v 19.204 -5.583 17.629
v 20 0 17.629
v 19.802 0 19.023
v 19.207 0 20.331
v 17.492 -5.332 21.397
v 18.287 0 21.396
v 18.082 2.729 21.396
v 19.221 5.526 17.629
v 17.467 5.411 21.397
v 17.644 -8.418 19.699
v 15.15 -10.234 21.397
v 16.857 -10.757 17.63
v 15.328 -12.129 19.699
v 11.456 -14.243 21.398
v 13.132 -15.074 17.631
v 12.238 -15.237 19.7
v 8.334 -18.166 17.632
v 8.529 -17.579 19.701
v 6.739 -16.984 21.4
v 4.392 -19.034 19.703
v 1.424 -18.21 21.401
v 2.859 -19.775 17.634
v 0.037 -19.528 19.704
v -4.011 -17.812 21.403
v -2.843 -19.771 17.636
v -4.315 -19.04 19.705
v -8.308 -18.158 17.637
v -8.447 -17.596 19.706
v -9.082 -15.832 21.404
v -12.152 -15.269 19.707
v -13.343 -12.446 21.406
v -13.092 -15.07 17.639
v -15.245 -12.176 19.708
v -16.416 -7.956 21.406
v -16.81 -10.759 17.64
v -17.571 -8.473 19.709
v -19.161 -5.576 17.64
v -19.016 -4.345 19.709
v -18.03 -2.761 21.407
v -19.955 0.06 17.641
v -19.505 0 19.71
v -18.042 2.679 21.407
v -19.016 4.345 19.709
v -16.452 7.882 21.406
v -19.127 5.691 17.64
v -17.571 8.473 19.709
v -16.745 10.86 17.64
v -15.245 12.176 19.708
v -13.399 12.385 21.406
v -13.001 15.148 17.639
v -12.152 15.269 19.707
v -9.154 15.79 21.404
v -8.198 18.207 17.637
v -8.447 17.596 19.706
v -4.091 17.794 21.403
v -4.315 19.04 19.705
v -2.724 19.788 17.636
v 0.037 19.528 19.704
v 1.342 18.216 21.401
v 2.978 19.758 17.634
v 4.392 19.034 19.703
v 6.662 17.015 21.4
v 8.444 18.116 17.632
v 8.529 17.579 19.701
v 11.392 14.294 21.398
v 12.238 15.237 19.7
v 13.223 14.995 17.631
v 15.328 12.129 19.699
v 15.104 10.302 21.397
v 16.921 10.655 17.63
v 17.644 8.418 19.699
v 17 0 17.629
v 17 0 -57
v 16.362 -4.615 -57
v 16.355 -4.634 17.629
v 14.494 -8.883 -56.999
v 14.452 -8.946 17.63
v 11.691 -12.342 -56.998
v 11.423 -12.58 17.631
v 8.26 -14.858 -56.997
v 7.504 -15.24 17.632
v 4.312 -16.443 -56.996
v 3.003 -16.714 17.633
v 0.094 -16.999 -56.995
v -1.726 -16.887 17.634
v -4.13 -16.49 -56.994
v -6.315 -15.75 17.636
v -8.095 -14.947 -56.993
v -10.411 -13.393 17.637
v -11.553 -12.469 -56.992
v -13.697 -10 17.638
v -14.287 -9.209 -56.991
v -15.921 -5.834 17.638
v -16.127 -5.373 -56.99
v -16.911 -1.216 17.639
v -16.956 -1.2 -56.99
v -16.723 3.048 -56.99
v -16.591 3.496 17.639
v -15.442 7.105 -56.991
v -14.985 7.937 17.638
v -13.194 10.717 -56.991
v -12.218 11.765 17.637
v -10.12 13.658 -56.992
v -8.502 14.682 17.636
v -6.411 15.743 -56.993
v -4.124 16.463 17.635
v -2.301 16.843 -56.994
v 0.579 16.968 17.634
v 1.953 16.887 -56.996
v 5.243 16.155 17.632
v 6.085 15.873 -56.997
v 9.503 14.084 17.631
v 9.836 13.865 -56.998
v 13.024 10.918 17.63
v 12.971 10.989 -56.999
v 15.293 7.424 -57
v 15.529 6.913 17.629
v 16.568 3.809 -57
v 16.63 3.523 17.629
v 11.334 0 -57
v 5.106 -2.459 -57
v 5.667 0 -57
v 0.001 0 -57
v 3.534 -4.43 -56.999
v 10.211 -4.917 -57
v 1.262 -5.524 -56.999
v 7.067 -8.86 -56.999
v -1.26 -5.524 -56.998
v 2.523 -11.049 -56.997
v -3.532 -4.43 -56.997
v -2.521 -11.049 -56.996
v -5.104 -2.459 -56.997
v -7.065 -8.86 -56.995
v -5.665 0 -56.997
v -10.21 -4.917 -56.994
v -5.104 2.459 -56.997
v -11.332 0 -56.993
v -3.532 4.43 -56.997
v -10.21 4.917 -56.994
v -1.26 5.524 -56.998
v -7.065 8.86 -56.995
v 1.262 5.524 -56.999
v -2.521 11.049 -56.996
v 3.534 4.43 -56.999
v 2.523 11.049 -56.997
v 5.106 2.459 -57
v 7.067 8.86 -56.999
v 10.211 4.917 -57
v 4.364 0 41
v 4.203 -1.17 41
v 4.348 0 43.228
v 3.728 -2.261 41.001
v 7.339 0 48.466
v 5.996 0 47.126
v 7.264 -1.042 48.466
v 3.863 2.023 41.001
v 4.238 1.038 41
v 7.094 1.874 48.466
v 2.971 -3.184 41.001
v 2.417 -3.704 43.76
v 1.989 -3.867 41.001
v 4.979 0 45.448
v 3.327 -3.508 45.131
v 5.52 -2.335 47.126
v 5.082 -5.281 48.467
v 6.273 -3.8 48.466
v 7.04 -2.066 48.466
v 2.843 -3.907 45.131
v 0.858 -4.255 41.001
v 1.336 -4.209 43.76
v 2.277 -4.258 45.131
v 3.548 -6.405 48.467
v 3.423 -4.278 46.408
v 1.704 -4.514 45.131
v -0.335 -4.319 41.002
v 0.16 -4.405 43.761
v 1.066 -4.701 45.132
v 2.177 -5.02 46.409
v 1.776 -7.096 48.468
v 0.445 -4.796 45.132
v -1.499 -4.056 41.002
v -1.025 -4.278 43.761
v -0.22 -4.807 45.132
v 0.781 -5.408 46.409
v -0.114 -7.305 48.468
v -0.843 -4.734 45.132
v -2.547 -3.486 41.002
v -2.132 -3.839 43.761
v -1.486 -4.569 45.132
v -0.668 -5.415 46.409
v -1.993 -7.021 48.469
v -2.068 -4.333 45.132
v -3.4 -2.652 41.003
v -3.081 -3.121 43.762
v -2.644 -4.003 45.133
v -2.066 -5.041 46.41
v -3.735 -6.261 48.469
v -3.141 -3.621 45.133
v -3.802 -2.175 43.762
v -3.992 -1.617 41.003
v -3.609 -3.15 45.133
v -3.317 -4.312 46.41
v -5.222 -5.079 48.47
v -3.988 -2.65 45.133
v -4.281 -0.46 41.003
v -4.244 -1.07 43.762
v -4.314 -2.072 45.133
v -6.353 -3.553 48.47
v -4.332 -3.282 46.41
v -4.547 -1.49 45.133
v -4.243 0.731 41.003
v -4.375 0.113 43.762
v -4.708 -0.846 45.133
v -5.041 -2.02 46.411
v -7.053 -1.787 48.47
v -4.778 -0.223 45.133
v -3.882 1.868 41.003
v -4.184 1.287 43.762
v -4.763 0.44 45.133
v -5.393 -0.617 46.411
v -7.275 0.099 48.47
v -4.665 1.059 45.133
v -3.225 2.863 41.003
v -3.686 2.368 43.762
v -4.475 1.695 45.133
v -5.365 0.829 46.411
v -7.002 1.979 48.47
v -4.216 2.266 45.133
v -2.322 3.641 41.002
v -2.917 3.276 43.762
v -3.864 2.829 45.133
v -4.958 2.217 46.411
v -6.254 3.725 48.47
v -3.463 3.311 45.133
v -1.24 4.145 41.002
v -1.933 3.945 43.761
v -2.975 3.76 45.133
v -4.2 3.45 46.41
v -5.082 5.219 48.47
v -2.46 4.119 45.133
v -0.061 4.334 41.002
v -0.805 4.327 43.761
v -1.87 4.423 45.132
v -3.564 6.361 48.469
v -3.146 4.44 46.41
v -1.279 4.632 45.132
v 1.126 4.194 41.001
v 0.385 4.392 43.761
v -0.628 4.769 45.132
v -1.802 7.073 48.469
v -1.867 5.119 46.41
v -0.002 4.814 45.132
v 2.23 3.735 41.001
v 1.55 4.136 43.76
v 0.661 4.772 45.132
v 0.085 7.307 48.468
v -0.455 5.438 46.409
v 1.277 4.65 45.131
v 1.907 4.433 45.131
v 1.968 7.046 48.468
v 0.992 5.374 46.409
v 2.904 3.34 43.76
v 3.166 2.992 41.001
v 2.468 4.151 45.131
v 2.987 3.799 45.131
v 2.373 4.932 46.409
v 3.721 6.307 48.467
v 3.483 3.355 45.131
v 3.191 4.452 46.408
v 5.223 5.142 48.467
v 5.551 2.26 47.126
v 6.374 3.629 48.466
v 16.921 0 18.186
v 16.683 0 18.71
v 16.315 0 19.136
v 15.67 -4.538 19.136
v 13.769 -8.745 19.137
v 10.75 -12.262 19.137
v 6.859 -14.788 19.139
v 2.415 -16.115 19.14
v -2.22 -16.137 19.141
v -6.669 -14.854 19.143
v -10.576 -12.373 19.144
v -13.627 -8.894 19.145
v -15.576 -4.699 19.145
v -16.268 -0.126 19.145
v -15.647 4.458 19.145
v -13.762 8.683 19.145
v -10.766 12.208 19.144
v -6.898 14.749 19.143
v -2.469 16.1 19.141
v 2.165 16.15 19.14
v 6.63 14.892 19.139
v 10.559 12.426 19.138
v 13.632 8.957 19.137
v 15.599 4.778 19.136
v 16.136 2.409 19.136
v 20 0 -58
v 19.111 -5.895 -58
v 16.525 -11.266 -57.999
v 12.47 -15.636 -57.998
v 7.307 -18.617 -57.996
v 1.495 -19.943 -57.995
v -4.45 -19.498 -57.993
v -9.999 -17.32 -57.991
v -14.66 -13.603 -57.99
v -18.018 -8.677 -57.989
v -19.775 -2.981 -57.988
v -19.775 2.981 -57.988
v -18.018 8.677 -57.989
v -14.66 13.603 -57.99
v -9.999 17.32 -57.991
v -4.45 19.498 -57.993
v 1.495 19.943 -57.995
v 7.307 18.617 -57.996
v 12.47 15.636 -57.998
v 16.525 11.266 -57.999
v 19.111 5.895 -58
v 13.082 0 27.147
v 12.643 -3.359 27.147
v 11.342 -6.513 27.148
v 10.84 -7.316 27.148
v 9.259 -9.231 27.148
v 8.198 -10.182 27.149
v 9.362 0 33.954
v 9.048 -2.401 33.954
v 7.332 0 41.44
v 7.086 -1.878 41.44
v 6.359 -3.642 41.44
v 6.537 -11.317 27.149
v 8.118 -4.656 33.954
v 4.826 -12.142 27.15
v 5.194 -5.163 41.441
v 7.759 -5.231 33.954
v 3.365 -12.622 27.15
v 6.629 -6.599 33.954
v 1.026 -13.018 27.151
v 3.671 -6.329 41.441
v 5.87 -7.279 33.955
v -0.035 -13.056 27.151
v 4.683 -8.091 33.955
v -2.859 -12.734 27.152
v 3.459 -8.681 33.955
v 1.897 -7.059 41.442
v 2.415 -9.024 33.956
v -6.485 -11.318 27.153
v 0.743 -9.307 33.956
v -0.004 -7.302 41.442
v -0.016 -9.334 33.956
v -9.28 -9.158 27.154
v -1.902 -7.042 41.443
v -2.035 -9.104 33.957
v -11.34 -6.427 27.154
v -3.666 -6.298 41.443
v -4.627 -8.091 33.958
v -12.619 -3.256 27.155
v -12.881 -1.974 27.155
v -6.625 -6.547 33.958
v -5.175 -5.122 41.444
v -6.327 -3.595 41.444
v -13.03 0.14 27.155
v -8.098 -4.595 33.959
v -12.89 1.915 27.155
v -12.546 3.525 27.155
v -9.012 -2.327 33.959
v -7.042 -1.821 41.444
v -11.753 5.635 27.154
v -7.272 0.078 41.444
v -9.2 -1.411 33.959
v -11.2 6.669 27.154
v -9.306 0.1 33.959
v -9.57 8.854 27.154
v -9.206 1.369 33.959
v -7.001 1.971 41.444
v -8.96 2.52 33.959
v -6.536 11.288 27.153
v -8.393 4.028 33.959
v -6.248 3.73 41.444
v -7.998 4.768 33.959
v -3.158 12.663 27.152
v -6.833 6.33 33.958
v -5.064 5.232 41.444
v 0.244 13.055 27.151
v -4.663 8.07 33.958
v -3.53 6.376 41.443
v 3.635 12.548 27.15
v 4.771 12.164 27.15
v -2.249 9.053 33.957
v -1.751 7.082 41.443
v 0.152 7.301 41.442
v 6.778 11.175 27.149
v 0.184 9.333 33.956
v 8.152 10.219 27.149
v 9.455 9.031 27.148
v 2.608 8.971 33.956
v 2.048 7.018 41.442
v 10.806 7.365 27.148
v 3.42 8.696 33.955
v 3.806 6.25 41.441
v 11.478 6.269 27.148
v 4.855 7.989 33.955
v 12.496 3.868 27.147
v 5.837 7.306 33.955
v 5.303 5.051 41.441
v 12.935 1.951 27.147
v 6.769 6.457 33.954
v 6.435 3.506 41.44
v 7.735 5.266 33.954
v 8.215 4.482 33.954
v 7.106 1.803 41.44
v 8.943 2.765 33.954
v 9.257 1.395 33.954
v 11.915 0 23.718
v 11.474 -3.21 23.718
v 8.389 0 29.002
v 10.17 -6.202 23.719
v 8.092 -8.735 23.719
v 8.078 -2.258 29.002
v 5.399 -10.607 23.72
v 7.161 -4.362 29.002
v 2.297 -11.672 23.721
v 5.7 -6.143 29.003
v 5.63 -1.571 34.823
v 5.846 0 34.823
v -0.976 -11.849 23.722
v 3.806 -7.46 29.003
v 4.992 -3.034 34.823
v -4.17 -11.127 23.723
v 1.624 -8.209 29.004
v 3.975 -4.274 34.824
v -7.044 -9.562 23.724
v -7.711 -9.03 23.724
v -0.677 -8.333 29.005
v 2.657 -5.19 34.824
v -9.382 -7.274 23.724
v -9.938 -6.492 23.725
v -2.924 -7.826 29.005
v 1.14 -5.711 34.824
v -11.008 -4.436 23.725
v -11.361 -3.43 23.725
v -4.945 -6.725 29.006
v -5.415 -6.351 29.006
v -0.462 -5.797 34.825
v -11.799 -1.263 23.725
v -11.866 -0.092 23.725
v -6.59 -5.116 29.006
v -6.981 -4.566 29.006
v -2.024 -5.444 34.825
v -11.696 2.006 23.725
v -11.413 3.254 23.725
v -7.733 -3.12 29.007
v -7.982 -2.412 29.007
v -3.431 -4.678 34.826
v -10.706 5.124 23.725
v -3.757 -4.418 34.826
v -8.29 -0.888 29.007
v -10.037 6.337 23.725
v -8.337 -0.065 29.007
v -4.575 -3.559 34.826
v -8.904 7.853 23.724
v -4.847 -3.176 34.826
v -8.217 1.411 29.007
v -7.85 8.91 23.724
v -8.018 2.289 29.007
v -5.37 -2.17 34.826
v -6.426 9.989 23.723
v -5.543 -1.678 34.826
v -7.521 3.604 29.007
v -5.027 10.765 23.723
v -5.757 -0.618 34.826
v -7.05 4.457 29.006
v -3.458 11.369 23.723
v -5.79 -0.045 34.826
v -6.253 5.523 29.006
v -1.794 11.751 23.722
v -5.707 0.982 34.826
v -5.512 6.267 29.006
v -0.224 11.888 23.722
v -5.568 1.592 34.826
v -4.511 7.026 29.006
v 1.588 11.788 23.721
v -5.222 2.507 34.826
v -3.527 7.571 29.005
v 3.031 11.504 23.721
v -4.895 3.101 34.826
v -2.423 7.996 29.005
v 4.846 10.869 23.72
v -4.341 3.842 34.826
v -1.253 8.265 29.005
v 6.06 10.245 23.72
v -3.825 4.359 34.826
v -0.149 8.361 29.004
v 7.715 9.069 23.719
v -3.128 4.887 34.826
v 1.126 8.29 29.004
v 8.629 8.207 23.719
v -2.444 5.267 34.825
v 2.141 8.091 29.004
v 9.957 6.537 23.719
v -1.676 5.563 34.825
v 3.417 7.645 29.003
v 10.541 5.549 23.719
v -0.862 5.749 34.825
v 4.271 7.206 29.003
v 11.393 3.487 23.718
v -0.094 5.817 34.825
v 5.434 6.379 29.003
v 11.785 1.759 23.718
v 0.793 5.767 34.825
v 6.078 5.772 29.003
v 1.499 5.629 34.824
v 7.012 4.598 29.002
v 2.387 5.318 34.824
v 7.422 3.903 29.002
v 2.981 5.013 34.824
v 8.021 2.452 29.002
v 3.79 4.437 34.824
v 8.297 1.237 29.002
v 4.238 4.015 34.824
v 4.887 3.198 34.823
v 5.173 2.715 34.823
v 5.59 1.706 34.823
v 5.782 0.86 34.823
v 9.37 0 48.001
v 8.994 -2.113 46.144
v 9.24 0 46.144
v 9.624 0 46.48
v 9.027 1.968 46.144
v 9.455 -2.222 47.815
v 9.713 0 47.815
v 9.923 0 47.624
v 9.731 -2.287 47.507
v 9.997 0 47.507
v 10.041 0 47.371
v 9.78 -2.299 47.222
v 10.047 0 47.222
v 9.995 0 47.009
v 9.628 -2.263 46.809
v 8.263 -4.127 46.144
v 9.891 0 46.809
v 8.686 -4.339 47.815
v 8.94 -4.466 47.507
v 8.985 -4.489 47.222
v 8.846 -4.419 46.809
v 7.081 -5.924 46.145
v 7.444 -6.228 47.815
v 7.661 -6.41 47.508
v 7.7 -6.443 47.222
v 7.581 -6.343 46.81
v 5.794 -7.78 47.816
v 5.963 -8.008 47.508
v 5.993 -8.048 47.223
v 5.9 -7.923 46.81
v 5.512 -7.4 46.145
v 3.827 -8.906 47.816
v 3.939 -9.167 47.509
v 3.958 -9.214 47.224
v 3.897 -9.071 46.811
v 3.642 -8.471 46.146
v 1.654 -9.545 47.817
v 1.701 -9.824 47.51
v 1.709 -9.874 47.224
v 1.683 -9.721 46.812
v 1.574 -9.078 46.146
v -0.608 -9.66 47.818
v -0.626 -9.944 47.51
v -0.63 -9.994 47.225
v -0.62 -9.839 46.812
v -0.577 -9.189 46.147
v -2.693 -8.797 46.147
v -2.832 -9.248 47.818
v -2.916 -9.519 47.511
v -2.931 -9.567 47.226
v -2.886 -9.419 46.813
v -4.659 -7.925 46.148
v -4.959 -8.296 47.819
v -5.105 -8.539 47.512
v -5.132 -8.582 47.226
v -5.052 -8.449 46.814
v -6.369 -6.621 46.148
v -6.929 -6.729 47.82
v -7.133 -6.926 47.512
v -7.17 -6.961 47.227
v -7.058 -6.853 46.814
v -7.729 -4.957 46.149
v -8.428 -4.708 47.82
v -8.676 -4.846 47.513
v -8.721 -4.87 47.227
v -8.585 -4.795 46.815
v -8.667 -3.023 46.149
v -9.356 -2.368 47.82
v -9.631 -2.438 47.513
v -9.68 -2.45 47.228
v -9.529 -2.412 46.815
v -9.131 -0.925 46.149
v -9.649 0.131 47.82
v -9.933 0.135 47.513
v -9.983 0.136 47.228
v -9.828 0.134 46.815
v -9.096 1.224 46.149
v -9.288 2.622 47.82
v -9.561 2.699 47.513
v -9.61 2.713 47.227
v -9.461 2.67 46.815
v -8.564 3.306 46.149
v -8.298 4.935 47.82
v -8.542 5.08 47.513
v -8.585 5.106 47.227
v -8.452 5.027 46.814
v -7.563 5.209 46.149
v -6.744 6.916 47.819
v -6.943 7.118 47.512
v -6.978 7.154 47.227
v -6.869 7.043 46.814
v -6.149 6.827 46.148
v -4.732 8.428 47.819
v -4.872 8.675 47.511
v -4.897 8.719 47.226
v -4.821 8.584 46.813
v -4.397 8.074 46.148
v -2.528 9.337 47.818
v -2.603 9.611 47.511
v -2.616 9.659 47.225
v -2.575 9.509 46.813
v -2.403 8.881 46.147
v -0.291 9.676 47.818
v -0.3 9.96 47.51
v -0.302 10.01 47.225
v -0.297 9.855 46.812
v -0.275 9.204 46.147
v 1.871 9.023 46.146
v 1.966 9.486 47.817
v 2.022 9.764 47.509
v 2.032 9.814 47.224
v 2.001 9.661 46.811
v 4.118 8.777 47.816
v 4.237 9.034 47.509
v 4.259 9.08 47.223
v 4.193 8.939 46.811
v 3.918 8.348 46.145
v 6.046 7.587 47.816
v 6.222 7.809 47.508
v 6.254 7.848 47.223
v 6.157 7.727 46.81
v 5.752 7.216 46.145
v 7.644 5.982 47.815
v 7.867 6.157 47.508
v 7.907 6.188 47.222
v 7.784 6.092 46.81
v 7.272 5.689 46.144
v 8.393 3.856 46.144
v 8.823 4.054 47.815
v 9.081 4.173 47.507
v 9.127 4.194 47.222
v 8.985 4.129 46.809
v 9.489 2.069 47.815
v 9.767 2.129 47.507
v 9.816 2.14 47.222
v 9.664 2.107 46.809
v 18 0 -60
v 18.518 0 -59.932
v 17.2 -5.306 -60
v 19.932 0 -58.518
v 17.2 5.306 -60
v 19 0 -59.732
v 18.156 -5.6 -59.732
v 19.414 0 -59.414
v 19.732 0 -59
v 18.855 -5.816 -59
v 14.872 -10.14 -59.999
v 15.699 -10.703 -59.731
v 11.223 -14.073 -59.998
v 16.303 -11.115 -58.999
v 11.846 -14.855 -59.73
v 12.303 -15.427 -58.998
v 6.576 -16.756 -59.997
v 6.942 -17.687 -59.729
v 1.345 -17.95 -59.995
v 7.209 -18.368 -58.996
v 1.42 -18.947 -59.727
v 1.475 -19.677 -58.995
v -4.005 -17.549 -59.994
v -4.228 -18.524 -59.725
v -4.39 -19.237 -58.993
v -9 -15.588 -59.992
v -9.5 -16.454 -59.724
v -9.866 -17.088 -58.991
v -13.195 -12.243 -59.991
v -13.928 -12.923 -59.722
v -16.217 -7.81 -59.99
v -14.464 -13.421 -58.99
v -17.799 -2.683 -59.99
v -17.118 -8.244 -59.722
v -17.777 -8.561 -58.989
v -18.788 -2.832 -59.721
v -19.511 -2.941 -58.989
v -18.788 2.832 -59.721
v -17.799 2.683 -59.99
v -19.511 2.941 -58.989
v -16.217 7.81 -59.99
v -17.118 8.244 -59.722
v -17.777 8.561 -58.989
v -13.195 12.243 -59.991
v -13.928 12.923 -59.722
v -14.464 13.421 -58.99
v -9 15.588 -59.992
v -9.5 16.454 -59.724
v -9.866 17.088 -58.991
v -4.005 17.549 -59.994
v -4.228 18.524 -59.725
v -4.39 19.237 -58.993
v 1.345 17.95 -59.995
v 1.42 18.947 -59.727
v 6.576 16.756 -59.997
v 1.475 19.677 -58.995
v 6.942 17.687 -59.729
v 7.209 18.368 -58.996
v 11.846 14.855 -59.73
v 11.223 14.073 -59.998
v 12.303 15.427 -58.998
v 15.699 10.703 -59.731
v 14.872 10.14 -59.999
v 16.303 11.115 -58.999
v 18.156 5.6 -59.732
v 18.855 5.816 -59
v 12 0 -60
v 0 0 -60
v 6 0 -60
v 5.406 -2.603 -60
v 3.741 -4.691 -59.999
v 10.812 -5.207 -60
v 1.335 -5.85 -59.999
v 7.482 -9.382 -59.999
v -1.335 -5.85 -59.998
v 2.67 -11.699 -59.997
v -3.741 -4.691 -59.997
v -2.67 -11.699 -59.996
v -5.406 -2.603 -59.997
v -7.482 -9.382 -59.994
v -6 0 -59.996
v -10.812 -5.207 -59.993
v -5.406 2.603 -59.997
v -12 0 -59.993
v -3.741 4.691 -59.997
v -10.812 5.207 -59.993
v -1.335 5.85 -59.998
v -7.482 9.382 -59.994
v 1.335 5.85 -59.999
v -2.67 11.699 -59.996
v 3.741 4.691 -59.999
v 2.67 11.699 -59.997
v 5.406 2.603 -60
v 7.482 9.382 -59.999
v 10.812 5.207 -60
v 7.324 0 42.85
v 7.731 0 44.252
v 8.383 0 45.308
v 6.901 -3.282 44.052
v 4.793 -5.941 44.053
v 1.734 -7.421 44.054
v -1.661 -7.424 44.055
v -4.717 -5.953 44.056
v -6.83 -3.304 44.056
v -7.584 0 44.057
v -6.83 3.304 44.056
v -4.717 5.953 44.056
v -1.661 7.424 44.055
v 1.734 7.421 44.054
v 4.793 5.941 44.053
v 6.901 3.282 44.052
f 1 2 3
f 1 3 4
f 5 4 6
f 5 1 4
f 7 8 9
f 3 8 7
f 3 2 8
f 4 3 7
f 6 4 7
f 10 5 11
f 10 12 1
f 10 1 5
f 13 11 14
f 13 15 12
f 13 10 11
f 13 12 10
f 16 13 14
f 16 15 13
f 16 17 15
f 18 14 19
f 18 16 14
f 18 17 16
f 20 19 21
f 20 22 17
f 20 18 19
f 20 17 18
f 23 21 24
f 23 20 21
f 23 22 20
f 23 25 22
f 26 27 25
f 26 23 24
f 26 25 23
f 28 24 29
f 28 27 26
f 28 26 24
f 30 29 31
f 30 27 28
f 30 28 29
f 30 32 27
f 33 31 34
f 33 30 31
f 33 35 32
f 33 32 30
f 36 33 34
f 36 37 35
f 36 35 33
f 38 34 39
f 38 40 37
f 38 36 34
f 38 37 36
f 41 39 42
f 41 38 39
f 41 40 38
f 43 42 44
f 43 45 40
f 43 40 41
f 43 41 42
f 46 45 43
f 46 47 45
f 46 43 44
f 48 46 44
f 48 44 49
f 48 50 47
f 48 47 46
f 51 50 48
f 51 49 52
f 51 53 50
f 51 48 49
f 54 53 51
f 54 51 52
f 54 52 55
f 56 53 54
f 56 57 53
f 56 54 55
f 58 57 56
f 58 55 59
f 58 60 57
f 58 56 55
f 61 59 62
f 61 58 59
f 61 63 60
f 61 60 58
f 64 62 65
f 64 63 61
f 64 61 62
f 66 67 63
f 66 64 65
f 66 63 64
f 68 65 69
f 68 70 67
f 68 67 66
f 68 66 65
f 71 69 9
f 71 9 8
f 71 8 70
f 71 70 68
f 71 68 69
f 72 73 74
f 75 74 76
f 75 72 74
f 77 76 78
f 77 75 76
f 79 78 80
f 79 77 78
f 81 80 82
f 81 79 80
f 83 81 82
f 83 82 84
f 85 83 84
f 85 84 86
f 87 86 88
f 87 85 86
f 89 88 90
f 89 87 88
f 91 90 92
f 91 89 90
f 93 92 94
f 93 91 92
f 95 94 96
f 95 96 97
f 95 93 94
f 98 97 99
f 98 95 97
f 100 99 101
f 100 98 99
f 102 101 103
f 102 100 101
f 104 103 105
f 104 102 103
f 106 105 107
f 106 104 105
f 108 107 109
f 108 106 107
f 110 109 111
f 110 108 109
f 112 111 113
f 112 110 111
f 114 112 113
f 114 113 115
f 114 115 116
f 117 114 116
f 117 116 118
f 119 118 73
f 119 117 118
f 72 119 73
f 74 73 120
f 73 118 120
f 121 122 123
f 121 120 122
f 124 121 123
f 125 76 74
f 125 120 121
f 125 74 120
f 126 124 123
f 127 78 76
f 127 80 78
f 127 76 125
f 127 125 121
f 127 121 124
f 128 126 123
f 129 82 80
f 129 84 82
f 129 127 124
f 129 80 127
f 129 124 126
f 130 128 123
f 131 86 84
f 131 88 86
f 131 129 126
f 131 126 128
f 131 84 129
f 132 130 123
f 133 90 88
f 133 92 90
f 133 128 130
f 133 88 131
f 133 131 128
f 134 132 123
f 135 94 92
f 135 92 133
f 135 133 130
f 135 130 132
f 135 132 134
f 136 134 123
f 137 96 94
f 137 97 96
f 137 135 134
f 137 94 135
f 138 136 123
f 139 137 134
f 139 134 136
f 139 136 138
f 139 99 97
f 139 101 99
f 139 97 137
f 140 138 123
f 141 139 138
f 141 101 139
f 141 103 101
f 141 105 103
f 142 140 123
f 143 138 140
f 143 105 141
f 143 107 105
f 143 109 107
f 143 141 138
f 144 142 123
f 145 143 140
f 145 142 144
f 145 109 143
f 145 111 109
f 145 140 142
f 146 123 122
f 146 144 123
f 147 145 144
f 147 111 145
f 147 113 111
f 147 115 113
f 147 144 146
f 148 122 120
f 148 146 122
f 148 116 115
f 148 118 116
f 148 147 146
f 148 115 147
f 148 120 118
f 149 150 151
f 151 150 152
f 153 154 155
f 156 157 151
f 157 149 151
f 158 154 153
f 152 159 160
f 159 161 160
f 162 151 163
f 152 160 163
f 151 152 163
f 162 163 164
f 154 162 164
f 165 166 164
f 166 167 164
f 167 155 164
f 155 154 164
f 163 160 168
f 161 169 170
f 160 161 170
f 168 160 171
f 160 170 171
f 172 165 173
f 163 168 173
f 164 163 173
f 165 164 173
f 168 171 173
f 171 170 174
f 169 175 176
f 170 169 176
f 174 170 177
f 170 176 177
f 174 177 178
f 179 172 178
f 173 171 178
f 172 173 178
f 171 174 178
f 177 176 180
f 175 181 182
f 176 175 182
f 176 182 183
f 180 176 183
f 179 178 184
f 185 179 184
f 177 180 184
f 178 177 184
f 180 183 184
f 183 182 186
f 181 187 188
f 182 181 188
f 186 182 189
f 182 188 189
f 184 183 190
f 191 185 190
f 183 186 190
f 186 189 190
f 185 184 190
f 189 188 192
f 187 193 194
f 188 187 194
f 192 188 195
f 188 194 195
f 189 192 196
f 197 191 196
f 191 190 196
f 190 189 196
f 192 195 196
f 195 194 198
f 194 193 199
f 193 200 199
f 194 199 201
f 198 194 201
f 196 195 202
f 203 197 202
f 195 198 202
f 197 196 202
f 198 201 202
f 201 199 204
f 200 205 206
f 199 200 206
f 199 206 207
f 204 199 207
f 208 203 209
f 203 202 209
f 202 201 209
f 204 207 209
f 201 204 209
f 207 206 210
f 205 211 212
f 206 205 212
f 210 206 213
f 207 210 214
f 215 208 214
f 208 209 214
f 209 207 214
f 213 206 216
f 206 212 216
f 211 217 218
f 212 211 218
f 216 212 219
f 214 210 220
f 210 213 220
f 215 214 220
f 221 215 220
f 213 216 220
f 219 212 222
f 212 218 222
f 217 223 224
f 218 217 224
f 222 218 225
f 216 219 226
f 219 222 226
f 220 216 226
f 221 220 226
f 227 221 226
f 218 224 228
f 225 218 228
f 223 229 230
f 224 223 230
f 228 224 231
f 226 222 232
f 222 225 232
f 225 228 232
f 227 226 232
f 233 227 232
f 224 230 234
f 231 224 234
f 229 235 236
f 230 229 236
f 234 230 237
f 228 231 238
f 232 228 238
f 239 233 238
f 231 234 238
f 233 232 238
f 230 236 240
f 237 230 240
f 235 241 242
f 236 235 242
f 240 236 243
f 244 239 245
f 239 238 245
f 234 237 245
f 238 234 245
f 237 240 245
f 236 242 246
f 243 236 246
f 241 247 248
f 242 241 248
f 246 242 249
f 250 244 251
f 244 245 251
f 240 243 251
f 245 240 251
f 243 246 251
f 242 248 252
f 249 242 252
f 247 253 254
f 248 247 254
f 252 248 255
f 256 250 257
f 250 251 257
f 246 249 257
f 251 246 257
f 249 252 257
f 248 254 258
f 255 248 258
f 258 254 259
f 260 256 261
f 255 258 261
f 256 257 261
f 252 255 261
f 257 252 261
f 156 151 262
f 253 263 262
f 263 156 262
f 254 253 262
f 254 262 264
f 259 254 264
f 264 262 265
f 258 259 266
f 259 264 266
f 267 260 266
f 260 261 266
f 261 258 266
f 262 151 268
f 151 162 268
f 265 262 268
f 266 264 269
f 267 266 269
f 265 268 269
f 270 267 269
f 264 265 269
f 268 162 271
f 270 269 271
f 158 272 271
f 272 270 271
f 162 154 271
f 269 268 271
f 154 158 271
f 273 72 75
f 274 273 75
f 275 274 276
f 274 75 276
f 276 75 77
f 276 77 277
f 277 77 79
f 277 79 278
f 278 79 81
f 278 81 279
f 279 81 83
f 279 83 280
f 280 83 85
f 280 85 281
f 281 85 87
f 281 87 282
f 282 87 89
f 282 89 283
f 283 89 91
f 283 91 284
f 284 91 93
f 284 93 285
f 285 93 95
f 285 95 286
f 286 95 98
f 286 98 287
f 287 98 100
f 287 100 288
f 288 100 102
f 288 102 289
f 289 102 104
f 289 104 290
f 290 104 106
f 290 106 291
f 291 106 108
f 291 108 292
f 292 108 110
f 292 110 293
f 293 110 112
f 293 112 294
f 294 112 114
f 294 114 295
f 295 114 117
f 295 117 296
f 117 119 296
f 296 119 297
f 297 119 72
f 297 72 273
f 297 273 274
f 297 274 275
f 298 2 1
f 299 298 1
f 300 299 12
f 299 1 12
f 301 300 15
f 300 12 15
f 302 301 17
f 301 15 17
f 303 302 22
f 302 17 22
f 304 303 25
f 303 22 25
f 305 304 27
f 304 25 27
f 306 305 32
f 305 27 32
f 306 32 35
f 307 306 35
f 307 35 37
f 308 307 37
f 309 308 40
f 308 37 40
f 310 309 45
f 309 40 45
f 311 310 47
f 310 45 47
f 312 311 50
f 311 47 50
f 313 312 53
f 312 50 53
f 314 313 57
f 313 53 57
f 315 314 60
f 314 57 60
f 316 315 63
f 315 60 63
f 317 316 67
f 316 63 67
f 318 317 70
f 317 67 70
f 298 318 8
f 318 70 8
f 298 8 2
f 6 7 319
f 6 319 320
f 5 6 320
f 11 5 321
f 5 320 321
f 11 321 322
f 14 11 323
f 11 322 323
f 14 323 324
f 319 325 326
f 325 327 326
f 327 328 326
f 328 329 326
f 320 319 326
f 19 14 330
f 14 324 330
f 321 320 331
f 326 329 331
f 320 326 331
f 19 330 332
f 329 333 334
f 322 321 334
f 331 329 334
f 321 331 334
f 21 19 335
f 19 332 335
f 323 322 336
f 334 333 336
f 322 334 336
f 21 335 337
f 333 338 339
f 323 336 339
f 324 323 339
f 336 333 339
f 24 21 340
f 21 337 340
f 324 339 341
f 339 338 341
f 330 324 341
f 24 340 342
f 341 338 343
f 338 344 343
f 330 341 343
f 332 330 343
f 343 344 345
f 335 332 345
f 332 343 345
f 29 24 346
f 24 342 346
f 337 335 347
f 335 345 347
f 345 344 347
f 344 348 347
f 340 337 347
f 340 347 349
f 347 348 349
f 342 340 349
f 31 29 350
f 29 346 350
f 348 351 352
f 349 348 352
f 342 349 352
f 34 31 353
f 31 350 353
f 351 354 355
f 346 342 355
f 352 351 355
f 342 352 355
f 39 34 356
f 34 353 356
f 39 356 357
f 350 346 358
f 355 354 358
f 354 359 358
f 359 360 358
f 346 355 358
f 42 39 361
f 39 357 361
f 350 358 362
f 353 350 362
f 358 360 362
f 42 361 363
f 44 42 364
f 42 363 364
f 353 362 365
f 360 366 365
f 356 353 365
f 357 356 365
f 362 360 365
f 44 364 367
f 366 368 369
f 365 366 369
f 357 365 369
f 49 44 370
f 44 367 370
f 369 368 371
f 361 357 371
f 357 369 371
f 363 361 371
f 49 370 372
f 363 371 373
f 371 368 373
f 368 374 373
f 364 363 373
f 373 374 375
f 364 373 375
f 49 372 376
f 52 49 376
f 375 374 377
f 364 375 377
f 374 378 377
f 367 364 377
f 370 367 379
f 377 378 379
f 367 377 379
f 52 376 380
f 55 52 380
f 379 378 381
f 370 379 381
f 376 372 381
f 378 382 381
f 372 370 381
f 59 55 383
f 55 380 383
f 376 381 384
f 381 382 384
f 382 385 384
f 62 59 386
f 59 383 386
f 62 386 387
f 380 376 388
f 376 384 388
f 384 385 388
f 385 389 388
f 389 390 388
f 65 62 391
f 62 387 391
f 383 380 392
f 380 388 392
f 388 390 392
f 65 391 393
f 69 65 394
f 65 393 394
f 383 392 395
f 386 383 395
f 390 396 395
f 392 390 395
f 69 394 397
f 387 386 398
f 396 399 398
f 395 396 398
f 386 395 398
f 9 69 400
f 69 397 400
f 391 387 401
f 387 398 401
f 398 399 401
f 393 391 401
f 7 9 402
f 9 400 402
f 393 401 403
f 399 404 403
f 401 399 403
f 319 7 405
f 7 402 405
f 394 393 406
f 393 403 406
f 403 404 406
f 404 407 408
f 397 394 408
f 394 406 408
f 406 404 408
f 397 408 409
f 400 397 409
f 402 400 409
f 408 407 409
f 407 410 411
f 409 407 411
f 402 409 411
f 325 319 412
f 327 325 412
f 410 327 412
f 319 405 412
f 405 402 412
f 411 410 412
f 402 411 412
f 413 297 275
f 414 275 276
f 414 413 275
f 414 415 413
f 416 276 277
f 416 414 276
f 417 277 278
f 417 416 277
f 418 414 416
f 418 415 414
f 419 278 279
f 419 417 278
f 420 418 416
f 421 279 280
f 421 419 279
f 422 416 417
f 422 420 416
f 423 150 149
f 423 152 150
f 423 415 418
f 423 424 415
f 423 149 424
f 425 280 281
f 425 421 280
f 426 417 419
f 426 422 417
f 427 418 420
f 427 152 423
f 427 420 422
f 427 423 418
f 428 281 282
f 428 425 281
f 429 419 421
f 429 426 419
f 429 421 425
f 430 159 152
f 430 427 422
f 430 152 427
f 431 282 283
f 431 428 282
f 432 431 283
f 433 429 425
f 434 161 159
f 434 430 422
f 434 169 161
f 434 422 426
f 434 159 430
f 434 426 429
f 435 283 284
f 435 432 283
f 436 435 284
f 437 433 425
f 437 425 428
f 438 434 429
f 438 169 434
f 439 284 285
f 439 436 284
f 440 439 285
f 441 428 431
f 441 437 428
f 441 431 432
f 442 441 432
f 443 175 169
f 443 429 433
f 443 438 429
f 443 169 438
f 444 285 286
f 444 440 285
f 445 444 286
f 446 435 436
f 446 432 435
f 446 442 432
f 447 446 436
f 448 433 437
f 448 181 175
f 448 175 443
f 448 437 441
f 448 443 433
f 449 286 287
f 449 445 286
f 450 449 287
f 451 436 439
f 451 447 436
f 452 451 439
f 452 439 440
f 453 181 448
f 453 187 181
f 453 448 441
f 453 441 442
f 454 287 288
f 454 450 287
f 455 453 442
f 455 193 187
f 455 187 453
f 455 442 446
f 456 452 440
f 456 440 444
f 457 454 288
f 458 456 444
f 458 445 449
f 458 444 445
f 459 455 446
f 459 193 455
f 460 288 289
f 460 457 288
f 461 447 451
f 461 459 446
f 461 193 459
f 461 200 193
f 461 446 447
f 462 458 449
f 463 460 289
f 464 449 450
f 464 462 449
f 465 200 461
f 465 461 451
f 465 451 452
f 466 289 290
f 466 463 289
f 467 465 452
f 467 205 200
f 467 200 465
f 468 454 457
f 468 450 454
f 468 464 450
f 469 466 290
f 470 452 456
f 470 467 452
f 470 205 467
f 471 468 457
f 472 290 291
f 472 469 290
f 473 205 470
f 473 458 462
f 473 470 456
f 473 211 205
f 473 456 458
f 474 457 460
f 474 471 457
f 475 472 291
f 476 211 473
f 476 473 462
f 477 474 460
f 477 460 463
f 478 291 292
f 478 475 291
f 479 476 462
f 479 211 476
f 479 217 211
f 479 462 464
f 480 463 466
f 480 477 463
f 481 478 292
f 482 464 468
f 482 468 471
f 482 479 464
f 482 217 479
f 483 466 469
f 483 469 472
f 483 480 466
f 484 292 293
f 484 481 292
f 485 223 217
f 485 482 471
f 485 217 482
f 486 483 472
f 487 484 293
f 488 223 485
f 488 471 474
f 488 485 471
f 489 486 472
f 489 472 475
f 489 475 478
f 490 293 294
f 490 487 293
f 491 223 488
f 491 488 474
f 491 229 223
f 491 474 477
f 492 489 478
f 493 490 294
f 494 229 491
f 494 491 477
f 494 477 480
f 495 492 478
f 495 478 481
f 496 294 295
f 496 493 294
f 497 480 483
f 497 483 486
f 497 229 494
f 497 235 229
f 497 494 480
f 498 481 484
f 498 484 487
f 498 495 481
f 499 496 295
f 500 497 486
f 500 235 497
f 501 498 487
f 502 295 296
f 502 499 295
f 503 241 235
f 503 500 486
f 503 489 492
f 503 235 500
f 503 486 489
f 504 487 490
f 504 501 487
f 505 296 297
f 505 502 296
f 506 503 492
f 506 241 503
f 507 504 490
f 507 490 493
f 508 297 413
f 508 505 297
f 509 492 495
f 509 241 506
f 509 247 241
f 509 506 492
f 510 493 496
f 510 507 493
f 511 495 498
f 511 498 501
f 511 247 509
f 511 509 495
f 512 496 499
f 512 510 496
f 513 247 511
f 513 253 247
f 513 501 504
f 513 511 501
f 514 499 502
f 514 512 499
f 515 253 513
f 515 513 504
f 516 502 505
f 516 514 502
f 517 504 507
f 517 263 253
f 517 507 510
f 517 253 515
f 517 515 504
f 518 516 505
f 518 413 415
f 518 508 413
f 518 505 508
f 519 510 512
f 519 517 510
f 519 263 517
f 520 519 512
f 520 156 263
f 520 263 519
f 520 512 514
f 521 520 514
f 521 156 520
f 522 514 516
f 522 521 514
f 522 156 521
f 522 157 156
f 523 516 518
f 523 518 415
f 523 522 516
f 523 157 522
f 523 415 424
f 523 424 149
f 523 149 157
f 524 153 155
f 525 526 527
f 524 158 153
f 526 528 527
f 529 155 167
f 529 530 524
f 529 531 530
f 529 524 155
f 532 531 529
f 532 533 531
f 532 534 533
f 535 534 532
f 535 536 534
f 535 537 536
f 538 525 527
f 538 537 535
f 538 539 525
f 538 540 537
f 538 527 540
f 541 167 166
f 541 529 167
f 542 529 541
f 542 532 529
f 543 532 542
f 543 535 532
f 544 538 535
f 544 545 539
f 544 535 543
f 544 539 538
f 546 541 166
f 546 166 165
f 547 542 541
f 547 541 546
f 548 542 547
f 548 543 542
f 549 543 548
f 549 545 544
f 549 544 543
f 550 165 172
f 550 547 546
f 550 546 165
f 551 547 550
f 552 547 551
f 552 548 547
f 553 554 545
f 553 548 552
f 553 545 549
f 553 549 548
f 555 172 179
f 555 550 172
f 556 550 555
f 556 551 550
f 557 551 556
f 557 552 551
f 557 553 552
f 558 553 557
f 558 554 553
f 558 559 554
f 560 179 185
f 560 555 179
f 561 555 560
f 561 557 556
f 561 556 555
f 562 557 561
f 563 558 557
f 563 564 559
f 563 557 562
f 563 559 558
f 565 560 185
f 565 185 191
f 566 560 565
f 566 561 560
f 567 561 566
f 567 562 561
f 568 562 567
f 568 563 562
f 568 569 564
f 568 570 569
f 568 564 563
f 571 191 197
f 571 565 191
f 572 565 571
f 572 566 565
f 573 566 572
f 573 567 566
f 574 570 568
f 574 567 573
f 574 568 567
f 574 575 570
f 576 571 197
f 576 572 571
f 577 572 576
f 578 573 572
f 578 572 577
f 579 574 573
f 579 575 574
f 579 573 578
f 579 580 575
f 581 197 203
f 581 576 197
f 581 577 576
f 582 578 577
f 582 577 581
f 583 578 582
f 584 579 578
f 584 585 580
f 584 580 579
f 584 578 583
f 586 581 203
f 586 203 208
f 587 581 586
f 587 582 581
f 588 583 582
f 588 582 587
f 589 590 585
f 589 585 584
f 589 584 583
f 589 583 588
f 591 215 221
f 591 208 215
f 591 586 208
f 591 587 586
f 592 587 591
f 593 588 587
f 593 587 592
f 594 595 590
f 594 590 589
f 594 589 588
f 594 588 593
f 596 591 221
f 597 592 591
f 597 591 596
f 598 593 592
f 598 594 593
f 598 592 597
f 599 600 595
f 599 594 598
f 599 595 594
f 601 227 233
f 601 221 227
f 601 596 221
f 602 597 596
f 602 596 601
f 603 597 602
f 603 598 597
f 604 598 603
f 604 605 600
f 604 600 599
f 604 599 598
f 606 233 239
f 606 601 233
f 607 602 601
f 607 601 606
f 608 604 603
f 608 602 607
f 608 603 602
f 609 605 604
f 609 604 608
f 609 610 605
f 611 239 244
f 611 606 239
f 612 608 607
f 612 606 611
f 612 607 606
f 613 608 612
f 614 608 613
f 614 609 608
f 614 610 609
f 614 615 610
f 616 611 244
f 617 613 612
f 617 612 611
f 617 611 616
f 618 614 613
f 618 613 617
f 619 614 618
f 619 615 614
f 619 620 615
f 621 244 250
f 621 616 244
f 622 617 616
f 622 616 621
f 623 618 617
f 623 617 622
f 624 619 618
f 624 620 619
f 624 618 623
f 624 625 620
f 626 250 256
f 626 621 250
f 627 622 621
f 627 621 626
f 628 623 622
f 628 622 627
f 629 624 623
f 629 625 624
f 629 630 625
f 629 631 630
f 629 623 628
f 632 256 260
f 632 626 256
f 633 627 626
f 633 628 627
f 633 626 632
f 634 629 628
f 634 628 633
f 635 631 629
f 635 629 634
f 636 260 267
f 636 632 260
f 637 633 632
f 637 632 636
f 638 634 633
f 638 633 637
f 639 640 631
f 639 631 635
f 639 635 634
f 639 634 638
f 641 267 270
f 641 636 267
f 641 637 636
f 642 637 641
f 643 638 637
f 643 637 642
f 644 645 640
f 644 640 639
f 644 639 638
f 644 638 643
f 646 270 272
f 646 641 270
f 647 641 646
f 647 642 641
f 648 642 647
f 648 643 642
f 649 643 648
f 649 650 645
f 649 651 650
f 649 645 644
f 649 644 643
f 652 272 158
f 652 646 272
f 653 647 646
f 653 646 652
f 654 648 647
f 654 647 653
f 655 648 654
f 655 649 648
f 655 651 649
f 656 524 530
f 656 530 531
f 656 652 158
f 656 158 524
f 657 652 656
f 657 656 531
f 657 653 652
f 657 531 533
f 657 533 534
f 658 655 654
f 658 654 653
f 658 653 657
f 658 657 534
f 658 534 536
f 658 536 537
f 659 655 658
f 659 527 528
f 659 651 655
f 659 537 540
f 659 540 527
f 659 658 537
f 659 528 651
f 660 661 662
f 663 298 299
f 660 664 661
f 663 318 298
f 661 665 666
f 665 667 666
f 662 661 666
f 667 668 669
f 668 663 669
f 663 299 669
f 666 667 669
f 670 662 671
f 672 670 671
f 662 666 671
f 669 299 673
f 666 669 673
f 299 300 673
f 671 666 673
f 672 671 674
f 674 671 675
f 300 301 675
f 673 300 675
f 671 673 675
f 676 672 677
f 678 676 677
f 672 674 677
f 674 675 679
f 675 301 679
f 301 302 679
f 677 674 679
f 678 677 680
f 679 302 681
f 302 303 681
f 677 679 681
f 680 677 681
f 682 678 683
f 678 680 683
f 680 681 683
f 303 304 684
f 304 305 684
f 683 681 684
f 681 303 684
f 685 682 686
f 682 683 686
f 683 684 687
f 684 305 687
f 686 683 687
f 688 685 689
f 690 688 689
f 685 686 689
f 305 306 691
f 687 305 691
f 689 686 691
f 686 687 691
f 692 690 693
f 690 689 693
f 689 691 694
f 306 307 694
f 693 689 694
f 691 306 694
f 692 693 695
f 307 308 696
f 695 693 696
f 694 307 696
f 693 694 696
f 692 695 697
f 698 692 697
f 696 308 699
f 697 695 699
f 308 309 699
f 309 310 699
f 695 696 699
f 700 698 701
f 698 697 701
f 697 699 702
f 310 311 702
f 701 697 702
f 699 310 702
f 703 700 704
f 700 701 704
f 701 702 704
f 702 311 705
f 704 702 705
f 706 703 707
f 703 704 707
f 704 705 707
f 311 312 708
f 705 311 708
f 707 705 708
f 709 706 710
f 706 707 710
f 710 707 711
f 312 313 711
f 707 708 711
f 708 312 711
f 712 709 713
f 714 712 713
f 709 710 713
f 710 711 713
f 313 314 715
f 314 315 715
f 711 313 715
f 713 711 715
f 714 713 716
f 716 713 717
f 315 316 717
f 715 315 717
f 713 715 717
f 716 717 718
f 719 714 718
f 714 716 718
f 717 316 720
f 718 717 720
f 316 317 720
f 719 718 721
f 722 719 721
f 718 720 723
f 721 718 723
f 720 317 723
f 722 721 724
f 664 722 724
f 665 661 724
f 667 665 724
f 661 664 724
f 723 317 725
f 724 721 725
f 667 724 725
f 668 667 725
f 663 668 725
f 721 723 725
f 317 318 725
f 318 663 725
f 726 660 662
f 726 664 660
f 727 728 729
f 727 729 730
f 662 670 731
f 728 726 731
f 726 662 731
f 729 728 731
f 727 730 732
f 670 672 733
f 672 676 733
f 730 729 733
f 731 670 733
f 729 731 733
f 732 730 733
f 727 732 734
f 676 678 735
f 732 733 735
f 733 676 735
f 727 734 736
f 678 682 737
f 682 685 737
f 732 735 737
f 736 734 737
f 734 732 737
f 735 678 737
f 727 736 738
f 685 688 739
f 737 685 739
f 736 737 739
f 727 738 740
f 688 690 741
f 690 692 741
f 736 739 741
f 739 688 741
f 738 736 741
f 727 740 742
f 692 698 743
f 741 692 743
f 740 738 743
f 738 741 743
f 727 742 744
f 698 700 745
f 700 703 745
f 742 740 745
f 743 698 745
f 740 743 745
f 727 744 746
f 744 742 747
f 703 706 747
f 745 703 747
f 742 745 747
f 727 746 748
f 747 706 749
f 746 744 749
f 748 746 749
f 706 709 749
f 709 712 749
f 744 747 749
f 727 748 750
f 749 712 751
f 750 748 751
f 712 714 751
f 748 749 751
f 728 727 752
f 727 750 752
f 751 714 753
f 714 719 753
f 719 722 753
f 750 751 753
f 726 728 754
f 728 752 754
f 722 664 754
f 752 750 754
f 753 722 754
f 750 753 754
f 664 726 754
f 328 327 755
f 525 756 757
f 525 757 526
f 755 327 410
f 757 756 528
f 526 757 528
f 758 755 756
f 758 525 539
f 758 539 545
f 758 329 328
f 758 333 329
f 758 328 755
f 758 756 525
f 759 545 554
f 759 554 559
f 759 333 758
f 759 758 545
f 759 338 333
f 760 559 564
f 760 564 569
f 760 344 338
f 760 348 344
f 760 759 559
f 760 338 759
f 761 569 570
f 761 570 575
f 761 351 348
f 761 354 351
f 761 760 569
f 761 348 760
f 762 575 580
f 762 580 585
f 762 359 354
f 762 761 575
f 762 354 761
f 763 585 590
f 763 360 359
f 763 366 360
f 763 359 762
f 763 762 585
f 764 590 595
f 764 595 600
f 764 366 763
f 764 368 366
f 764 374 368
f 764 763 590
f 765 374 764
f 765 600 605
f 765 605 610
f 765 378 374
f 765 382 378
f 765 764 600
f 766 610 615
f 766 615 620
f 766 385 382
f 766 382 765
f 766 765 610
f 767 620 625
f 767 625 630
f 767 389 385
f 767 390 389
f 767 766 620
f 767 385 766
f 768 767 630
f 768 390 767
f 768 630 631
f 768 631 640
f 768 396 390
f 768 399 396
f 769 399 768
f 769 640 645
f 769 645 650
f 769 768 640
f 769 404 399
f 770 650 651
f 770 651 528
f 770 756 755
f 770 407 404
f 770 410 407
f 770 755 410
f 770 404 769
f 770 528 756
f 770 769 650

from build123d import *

# Parameters (mm, degrees)
F2_R = 5
F3_T = 3


# Not quite as in the source:
# - a shell that OpenCascade refuses in one call is made with other operations: the cavity is built on its own and cut out


with BuildPart() as f1:
    # F0 (on Front) → F1 (revolve)
    with BuildSketch(Plane.XZ):
        with BuildLine():
            Line((0.0303446585, 43.9893868108), (0, -60))
            Line((0, -60), (18, -60))
            ThreePointArc((18, -60), (19.4142135624, -59.4142135624), (20, -58))
            Line((20, -58), (20, 20))
            ThreePointArc((20, 20), (10.699829352, 31.0439112631), (7, 45))
            add(Edge.make_bspline(
                [(7, 45), (5.0981917384, 44.3288351313), (2.5656114194, 43.9919770233), (0.0303446585, 43.9893868108)],
                knots=[0.7335604777, 0.7335604777, 0.7335604777, 0.7335604777, 0.8662634951, 0.8662634951, 0.8662634951, 0.8662634951], degree=3))
        make_face()
        with BuildLine():
            Line((0.0317348174, 48.7533809147), (0.0303446585, 43.9893868108))
            add(Edge.make_bspline(
                [(7, 45), (5.0981917384, 44.3288351313), (2.5656114194, 43.9919770233), (0.0303446585, 43.9893868108)],
                knots=[0.7335604777, 0.7335604777, 0.7335604777, 0.7335604777, 0.8662634951, 0.8662634951, 0.8662634951, 0.8662634951], degree=3))
            add(Edge.make_bspline(
                [(0.0317348174, 48.7533809147), (4.7629433155, 48.7522243079), (12.4211351263, 48.5438301873), (9.0166847824, 45.7117058036), (7, 45)],
                knots=[0.3671333927, 0.3671333927, 0.3671333927, 0.3671333927, 0.5928416886, 0.7335604777, 0.7335604777, 0.7335604777, 0.7335604777], degree=3))
        make_face()
        with BuildLine():
            add(Edge.make_bspline(
                [(0.0303446585, 43.9893868108), (-2.5246666918, 43.9867764257), (-5.0824064908, 44.3236607489), (-7, 45)],
                knots=[0.8662634951, 0.8662634951, 0.8662634951, 0.8662634951, 1, 1, 1, 1], degree=3))
            Line((0.0303446585, 43.9893868108), (0.0317348174, 48.7533809147))
            add(Edge.make_bspline(
                [(-7, 45), (-9.0177096511, 45.7116504242), (-12.4328083134, 48.5488604685), (-4.7142790246, 48.7545411409), (0.0317348174, 48.7533809147)],
                knots=[0, 0, 0, 0, 0.1407187891, 0.3671333927, 0.3671333927, 0.3671333927, 0.3671333927], degree=3))
        make_face()
    revolve(axis=Axis((0.0158674087, 0, -5.6233095426), (-0.0002918053, 0, -0.9999999574)))

    # F2
    f2_edges = [f1.edges().sort_by_distance(p)[0] for p in [
        (-19.953308, 0, 20.011659),
        (-6.93872, 0, 45.004067),
    ]]
    fillet(f2_edges, radius=F2_R)

    # F3: shell of thickness 3, made by hand


with BuildPart() as f3_core1:
    # F3_t2: copy of F1
    add(f1.part)

    # the walls: a layer under each face that stays
    f3_faces = [f3_core1.faces().sort_by_distance(p)[0] for p in [
        (-19.9767604628, 0, -20.1738934498),
        (-19.5052168736, 0, 19.7095019558),
        (-10.9686231738, 0, 30.4472386816),
        (-8.9999984673, 0, -59.9947475043),
        (-7.5836491668, 0, 44.0565358923),
    ]]
    thicken(f3_faces, amount=-F3_T, mode=Mode.SUBTRACT)


with BuildPart() as f1_1:
    add(f1.part)

    # what is left inside the walls is the cavity
    f3_cavity = [f3_core1.part.solids().sort_by_distance(p)[0] for p in [
        (-16.953728, 0, -32.113807),
    ]]
    add(f3_cavity, mode=Mode.SUBTRACT)


solid = f1_1.part
